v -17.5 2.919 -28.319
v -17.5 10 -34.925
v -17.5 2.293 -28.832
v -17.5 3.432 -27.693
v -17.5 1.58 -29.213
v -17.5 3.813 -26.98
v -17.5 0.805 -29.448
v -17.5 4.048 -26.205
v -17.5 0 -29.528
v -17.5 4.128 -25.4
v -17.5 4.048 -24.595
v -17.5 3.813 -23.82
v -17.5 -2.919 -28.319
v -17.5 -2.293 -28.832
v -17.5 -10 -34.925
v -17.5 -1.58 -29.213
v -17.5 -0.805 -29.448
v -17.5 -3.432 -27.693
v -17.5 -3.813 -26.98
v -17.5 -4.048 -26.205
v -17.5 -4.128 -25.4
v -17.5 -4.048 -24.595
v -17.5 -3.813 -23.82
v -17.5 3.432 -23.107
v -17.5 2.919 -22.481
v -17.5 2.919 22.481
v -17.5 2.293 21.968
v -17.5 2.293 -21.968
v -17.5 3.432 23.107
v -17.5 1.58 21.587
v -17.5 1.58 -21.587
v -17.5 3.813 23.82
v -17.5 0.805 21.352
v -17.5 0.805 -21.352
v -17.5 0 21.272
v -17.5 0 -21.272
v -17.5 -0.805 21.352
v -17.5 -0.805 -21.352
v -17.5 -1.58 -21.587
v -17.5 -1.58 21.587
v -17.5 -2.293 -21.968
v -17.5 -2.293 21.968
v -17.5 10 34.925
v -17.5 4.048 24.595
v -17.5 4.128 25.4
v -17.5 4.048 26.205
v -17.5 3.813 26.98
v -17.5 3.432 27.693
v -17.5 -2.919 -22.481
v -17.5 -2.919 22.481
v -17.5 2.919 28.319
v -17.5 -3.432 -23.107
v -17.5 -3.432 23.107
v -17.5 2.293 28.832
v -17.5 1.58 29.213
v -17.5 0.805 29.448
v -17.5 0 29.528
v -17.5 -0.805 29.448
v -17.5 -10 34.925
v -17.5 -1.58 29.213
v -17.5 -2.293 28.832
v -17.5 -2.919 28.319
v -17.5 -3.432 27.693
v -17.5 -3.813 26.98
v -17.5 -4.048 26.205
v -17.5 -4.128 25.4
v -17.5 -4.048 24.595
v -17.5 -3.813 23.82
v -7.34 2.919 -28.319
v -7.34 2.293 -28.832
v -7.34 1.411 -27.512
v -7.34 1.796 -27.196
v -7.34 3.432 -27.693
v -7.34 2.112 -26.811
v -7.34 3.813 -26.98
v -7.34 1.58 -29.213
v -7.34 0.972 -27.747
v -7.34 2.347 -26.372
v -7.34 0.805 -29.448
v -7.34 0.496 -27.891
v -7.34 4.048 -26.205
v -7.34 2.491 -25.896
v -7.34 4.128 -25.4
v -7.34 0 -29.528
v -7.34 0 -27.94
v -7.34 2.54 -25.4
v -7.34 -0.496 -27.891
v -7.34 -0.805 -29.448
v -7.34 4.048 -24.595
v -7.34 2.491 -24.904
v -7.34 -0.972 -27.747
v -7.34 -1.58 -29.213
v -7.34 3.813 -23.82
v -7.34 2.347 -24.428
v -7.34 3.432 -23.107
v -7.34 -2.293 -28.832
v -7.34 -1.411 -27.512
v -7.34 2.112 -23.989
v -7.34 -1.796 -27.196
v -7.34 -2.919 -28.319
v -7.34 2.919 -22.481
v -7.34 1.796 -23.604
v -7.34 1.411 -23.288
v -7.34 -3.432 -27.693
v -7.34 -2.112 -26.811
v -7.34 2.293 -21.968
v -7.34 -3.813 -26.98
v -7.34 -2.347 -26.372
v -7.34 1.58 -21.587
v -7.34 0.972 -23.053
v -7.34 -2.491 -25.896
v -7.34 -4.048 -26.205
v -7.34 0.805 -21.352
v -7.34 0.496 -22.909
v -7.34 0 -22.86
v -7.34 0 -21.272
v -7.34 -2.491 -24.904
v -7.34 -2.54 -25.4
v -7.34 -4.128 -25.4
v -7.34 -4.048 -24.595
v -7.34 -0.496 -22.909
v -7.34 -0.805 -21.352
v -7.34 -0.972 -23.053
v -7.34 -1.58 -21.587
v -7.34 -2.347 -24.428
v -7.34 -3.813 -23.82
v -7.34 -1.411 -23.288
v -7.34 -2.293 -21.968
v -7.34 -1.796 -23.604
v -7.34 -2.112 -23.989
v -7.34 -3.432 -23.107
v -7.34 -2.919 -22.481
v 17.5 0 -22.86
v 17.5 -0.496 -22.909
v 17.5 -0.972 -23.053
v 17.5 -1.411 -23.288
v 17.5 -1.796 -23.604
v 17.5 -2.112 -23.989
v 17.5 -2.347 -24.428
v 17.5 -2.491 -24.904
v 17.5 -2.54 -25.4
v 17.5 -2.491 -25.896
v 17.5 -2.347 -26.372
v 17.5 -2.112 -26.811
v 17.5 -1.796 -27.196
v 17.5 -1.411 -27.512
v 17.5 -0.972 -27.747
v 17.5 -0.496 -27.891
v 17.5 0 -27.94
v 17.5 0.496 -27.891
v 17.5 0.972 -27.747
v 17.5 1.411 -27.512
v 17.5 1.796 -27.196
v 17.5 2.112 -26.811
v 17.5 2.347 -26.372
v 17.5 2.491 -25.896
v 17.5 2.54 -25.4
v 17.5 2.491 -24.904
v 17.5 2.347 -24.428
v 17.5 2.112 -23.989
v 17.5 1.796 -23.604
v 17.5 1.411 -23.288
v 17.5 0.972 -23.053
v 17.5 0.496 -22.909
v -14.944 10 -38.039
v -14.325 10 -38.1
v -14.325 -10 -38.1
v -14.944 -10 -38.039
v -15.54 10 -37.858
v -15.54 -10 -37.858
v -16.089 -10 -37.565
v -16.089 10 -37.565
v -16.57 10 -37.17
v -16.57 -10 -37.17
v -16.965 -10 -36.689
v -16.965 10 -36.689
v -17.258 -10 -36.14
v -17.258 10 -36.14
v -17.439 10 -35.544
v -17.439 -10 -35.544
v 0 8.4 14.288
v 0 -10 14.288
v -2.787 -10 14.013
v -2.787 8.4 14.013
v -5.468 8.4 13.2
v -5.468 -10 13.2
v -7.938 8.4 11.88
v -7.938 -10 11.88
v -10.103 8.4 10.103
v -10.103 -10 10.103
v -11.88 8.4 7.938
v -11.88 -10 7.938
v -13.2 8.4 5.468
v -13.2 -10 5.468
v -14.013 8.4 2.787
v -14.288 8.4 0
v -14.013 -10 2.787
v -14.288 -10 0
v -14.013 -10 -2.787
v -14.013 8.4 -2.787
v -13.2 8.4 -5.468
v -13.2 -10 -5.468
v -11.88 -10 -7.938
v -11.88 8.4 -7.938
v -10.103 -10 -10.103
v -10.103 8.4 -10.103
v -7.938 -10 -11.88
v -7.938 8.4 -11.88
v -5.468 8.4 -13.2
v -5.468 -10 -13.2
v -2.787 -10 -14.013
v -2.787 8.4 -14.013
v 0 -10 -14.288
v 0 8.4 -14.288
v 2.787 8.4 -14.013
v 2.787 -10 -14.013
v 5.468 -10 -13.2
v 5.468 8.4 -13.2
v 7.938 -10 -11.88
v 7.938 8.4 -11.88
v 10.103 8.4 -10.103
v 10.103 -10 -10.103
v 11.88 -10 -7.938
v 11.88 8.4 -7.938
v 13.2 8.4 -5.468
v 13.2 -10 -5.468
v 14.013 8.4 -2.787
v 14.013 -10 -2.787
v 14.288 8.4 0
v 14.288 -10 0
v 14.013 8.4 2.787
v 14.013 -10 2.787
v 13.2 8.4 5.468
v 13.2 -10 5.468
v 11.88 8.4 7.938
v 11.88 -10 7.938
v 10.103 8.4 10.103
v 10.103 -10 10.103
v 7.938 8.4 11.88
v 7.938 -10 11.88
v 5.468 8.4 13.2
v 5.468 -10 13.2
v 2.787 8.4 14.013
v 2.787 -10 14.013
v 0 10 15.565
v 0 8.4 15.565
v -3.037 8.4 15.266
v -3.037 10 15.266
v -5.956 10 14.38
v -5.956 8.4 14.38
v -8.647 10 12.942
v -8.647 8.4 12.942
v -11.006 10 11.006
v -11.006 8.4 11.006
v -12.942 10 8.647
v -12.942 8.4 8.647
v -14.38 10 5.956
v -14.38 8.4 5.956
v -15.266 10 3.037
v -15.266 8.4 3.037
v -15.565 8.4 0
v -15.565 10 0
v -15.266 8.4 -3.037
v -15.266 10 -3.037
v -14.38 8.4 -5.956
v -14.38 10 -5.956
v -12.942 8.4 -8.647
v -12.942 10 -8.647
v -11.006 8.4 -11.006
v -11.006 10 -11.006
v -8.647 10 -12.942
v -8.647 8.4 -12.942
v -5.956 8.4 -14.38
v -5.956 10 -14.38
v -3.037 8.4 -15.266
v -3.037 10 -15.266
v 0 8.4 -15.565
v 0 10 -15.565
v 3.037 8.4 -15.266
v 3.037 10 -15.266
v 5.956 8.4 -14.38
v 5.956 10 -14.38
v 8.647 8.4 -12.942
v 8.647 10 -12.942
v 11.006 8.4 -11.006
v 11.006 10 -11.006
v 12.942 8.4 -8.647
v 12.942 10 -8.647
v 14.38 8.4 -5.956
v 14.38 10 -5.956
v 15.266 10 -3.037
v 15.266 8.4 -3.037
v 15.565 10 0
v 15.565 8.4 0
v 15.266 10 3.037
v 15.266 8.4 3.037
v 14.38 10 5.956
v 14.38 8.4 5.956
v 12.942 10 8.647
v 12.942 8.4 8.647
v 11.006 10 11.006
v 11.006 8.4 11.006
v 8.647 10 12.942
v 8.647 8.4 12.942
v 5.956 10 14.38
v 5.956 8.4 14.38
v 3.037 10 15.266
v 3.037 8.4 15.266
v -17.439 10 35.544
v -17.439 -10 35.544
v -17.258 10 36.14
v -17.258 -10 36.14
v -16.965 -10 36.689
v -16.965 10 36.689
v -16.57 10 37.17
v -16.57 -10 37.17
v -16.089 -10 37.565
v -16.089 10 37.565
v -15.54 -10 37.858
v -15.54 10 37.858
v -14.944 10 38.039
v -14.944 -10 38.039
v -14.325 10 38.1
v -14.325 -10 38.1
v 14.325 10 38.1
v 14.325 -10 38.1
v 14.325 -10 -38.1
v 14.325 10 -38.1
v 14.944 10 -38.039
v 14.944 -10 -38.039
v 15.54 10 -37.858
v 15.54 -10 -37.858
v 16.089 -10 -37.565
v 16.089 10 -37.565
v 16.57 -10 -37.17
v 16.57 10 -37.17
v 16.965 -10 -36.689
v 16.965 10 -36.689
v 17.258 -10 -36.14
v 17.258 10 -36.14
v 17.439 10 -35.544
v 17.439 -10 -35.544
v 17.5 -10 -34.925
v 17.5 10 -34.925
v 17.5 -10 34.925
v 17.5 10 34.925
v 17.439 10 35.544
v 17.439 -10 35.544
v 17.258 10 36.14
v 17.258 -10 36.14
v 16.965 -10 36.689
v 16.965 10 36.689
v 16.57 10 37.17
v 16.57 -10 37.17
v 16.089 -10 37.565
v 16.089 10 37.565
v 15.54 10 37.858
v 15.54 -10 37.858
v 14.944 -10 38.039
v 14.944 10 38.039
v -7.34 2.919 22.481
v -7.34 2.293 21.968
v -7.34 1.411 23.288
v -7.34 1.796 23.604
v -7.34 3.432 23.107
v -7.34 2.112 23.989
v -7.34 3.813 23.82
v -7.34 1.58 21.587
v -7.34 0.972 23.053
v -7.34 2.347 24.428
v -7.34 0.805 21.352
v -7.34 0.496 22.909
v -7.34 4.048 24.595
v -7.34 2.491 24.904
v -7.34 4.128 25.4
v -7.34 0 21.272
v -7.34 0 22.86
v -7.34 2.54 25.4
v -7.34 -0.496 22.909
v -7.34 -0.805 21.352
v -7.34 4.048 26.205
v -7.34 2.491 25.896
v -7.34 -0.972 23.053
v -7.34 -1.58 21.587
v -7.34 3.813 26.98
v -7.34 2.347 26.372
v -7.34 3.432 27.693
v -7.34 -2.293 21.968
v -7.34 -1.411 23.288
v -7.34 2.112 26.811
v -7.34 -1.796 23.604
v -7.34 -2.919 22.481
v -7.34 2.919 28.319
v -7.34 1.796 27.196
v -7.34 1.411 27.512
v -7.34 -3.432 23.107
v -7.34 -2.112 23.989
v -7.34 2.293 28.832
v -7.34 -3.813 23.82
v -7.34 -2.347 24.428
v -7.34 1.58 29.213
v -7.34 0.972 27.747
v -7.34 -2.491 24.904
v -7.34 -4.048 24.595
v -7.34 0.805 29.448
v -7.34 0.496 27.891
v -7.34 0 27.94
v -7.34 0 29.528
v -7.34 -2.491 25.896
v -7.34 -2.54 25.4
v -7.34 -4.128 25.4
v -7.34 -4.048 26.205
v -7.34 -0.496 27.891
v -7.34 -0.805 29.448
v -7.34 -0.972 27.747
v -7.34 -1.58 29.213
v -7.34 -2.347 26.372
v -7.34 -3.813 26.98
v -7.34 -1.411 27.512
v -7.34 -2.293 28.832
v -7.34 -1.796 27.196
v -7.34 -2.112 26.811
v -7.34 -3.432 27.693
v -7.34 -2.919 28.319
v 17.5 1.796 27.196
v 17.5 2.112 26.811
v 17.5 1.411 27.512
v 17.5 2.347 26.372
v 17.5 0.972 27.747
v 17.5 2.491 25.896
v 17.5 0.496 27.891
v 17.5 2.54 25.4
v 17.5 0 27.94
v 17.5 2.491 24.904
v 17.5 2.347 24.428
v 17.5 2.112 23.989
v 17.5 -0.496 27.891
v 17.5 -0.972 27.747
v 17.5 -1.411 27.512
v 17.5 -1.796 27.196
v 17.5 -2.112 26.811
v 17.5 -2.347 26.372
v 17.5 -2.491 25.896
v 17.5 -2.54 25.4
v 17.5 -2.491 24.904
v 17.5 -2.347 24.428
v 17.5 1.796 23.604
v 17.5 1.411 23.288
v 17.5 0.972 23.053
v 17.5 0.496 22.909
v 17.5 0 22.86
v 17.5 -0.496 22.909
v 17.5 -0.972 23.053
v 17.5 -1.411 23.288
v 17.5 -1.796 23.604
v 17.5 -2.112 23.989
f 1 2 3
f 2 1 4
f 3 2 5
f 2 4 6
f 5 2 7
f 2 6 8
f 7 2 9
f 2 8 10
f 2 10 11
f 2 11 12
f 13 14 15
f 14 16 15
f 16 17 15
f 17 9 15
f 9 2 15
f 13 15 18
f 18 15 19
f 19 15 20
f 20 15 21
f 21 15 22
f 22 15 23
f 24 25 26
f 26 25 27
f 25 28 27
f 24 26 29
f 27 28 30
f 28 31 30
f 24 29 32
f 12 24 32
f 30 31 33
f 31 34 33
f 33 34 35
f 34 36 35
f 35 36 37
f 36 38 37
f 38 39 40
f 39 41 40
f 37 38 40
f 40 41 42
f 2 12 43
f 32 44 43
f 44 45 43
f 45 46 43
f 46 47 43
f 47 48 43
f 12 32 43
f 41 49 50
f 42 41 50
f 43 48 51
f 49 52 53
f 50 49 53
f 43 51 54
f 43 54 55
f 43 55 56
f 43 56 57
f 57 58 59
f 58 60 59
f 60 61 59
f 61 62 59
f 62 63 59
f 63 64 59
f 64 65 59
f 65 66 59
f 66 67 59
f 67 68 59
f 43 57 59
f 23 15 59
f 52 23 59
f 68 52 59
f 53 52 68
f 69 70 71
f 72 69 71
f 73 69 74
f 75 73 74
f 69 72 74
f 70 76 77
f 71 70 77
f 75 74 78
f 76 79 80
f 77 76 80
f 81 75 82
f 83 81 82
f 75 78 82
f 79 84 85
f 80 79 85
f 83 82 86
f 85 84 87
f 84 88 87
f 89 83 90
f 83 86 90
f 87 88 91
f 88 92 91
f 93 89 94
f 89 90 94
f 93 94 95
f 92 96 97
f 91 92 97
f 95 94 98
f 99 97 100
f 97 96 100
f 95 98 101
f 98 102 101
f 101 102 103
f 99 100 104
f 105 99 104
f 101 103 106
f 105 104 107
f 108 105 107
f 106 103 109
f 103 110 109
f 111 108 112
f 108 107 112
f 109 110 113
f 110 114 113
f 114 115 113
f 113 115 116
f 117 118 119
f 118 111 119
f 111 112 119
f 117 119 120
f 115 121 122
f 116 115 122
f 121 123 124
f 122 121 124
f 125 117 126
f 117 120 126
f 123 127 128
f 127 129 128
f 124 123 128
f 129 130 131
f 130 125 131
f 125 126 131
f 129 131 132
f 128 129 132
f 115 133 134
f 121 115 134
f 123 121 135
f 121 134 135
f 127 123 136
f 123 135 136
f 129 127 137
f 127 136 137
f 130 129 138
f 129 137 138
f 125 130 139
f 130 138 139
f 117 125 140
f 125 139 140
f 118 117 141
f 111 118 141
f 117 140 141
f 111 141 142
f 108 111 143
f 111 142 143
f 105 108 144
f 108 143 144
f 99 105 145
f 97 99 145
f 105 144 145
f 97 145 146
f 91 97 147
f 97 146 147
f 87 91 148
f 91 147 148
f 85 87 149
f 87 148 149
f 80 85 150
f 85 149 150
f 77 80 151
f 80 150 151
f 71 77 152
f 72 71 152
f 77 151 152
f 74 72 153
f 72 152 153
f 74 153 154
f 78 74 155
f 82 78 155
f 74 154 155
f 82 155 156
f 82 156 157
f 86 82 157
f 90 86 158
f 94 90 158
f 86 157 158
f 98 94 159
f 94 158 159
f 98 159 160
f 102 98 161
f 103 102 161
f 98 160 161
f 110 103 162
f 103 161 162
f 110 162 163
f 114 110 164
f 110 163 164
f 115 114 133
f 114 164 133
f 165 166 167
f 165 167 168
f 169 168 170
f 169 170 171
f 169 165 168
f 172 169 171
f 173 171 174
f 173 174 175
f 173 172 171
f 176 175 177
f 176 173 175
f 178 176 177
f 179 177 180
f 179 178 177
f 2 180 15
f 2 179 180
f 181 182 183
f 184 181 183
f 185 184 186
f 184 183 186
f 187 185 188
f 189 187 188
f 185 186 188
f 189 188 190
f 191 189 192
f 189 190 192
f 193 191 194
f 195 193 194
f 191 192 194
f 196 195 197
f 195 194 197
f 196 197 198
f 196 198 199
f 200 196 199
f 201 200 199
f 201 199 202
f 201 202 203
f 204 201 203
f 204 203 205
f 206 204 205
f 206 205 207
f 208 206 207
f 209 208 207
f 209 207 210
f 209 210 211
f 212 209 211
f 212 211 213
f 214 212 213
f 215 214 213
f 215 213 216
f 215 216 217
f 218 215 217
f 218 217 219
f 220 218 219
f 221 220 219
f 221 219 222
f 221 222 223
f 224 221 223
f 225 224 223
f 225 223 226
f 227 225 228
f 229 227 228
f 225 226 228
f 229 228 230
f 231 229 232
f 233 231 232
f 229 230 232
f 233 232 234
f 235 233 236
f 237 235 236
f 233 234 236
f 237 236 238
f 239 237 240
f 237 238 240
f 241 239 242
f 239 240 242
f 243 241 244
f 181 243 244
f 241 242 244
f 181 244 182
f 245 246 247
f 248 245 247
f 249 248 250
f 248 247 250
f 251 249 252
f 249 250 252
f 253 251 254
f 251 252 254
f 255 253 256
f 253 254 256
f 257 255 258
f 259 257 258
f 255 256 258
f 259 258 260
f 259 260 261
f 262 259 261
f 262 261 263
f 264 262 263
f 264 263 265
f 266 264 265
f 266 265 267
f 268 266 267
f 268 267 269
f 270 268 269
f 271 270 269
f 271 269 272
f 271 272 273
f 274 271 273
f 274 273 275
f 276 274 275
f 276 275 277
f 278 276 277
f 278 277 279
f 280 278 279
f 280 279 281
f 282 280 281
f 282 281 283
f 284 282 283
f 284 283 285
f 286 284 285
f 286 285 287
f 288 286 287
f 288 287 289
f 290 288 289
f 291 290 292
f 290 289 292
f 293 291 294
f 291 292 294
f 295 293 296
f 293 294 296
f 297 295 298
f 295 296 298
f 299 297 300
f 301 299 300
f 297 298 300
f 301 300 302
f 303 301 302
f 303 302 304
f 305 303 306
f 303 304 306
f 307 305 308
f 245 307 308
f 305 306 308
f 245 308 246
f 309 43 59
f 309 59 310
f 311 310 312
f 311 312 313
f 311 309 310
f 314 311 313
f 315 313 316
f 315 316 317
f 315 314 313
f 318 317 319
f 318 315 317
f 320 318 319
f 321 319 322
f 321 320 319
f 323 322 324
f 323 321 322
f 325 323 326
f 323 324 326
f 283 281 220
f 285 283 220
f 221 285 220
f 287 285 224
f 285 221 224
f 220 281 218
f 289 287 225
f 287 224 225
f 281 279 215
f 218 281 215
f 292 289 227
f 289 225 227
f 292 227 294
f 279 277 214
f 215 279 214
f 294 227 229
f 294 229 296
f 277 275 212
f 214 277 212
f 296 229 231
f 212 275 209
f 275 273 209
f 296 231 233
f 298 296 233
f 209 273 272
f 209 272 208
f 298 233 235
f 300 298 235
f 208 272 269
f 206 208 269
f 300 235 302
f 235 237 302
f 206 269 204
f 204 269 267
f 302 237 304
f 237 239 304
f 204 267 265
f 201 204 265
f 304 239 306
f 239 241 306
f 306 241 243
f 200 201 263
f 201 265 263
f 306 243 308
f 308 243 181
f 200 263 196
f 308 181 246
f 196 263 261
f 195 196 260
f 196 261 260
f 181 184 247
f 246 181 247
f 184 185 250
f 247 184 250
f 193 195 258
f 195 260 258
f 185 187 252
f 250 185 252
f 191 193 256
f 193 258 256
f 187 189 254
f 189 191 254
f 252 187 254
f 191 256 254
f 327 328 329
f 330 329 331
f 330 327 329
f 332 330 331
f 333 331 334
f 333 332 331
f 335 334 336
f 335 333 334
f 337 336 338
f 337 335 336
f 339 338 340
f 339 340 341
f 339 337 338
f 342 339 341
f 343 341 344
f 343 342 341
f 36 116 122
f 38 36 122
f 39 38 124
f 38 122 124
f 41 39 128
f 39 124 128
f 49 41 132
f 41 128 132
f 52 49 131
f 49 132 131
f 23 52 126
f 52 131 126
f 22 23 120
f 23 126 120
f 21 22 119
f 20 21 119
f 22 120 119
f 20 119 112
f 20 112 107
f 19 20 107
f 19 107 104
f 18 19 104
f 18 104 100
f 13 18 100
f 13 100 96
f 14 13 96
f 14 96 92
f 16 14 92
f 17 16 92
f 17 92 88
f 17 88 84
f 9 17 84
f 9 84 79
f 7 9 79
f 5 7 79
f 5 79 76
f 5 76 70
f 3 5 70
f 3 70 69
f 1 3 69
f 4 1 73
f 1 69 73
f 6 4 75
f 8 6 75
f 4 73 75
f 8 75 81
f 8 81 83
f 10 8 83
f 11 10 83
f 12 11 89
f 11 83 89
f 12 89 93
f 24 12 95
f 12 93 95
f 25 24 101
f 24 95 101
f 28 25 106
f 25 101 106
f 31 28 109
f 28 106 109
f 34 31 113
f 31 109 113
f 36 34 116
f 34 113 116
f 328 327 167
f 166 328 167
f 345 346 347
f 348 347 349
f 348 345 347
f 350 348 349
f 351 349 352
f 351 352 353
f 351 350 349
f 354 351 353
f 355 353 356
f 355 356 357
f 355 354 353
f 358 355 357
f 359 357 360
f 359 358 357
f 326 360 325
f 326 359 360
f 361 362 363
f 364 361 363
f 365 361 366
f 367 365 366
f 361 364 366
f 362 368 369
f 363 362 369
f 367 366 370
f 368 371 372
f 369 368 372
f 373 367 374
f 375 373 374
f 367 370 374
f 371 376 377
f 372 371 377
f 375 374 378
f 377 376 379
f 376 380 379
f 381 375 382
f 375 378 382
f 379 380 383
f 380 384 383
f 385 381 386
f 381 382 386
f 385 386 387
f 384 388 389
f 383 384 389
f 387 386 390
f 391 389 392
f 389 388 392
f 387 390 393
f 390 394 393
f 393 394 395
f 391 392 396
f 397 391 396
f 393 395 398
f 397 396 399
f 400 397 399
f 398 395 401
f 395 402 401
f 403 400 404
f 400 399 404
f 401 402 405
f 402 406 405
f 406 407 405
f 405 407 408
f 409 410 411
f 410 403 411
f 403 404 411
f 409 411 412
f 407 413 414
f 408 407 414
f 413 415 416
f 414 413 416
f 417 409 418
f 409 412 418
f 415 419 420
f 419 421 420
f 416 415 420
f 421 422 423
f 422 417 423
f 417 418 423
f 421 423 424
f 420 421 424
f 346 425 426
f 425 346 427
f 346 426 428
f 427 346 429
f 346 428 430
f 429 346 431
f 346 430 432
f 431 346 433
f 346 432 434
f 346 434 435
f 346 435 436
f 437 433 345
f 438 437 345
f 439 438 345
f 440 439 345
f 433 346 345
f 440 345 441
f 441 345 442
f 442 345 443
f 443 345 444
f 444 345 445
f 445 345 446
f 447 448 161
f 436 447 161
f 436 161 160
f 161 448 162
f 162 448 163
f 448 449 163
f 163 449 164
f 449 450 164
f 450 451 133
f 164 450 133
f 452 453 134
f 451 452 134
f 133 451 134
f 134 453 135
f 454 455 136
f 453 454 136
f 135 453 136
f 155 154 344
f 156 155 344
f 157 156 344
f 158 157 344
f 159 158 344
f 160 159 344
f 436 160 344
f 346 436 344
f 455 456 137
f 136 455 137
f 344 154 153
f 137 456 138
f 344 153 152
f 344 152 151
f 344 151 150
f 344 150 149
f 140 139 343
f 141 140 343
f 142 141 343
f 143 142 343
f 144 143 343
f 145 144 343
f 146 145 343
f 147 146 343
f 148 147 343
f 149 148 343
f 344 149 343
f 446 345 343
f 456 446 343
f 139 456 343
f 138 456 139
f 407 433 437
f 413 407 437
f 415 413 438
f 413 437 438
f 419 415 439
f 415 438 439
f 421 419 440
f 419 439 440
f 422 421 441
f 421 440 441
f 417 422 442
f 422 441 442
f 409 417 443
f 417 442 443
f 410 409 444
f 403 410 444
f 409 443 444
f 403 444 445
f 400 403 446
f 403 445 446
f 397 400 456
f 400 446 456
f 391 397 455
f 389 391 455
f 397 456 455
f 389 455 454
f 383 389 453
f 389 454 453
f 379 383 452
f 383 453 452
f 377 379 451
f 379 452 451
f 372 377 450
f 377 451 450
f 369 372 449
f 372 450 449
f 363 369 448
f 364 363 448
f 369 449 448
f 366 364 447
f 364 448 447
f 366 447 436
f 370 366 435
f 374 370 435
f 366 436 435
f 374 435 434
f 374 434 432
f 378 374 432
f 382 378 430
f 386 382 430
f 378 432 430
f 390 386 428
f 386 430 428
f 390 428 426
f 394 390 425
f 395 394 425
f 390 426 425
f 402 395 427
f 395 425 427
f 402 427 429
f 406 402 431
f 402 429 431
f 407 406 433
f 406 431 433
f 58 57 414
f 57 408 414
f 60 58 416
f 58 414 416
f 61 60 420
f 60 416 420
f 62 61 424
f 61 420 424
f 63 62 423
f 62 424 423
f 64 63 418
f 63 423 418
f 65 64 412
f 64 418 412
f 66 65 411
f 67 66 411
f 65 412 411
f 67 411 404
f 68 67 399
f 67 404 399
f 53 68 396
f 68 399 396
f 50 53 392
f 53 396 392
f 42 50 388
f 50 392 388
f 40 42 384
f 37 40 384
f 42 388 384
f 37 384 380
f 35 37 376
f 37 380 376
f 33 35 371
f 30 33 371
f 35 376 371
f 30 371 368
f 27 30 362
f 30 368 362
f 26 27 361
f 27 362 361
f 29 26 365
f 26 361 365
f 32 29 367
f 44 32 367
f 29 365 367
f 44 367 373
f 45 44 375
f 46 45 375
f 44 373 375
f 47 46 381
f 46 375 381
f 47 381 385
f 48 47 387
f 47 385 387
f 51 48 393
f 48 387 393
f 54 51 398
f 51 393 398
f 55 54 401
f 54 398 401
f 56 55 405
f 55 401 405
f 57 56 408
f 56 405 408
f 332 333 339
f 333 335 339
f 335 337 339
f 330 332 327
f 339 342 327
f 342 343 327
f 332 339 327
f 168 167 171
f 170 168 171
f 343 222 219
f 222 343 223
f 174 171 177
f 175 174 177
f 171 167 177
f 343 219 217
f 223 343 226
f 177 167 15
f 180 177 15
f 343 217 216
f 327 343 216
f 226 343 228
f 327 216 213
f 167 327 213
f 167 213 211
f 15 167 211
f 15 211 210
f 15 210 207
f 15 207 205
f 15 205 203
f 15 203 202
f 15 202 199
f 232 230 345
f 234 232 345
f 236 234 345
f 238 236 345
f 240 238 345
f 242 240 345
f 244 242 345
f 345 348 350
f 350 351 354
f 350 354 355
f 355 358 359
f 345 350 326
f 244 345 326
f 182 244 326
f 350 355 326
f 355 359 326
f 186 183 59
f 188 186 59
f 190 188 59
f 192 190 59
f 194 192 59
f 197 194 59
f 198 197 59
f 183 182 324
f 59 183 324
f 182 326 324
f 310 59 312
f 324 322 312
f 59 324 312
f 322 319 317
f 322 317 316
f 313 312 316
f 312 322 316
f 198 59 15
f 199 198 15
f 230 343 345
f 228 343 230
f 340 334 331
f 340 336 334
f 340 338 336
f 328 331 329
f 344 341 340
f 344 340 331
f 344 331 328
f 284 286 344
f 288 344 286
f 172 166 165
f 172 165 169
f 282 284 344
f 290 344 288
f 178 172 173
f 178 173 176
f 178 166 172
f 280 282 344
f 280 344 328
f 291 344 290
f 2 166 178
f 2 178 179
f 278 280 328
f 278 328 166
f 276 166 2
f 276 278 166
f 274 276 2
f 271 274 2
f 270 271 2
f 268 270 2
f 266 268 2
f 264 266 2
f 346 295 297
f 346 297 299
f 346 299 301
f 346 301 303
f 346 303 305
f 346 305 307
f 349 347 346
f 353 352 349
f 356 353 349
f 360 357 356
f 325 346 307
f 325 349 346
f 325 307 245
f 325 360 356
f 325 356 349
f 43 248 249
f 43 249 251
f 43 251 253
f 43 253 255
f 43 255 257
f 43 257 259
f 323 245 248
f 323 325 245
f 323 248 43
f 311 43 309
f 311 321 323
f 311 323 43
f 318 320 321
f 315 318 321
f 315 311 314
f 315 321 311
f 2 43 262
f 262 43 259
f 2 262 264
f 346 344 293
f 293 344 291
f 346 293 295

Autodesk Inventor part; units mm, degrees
ref_plane "YZ Plane" through (0, 0, 0) normal (1, 0, 0) x (0, 1, 0)
ref_plane "XZ Plane" through (0, 0, 0) normal (0, 1, 0) x (-1, 0, 0)
ref_plane "XY Plane" through (0, 0, 0) normal (0, 0, 1) x (1, 0, 0)
sketch "Sketch1" plane through (0, 0, 0) normal (0, 1, 0) x (-1, 0, 0)
  line L0 (0, -53.34) -> (0, 53.34) projected
  line L1 (-24.5, 0) -> (24.5, 0) projected
  line L2 (24.5, 0) -> (-24.5, 0) projected
  line L3 (0, -53.34) -> (0, 53.34) projected
  line L4 (-17.5, 38.1) -> (-17.5, -38.1)
  line L5 (-17.5, -38.1) -> (17.5, -38.1)
  line L6 (17.5, -38.1) -> (17.5, 38.1)
  line L7 (17.5, 38.1) -> (-17.5, 38.1)
  line L8 (-17.5, -38.1) -> (17.5, 38.1) construction
  point P0 (0, 0)
  dimension "d1" = 76.2
  dimension "d2" = 35
extrude "Extrusion1" add sketch "Sketch1" along normal mid plane 20
sketch "Sketch2" plane through (0, 10, 0) normal (0, 1, 0) x (1, 0, 0)
  point P0 (0, 0)
  point P1 (0, 0)
hole "Hole1" at (0, 10, 0) direction (0, -1, 0) diameter 28.575 end through all counterbore diameter 31.13 counterbore depth 1.6
fillet "Fillet1" radius 3.175 4 edges at (17.5, 0, 38.1) (17.5, 0, -38.1) (-17.5, 0, 38.1) (-17.5, 0, -38.1)
sketch "Sketch3" plane through (-17.5, -10, -34.925) normal (-1, 0, 0) x (0, 0, 1)
  line L0 (0, 0) -> (0, 20) projected
  line L1 (69.85, 0) -> (0, 0) projected
  line L2 (69.85, 20) -> (69.85, 0) projected
  line L3 (0, 20) -> (69.85, 20) projected
  line L4 (0, 20) -> (0, 0) projected
  line L5 (0, 0) -> (69.85, 0)
  line L6 (69.85, 0) -> (69.85, 20)
  line L7 (69.85, 20) -> (0, 20)
  line L8 (0, 20) -> (0, 0)
  line L9 (19.36, 20) -> (50.49, 20) projected
  line L10 (34.925, 20) -> (34.925, 0)
  line L11 (0, 10) -> (69.85, 10)
  line L12 (69.85, 0) -> (69.85, 20) projected
  point P0 (34.925, 10)
  point P1 (9.525, 10)
  point P2 (60.325, 10)
  dimension "d19" = 25.4
  dimension "d20" = 25.4
hole "Hole2" at (-17.5, 0, -25.4) at (-17.5, 0, 25.4) direction (1, 0, 0) diameter 5.08 end through all counterbore diameter 8.255 counterbore depth 10.16
properties part number "BearingBlock30mm"
